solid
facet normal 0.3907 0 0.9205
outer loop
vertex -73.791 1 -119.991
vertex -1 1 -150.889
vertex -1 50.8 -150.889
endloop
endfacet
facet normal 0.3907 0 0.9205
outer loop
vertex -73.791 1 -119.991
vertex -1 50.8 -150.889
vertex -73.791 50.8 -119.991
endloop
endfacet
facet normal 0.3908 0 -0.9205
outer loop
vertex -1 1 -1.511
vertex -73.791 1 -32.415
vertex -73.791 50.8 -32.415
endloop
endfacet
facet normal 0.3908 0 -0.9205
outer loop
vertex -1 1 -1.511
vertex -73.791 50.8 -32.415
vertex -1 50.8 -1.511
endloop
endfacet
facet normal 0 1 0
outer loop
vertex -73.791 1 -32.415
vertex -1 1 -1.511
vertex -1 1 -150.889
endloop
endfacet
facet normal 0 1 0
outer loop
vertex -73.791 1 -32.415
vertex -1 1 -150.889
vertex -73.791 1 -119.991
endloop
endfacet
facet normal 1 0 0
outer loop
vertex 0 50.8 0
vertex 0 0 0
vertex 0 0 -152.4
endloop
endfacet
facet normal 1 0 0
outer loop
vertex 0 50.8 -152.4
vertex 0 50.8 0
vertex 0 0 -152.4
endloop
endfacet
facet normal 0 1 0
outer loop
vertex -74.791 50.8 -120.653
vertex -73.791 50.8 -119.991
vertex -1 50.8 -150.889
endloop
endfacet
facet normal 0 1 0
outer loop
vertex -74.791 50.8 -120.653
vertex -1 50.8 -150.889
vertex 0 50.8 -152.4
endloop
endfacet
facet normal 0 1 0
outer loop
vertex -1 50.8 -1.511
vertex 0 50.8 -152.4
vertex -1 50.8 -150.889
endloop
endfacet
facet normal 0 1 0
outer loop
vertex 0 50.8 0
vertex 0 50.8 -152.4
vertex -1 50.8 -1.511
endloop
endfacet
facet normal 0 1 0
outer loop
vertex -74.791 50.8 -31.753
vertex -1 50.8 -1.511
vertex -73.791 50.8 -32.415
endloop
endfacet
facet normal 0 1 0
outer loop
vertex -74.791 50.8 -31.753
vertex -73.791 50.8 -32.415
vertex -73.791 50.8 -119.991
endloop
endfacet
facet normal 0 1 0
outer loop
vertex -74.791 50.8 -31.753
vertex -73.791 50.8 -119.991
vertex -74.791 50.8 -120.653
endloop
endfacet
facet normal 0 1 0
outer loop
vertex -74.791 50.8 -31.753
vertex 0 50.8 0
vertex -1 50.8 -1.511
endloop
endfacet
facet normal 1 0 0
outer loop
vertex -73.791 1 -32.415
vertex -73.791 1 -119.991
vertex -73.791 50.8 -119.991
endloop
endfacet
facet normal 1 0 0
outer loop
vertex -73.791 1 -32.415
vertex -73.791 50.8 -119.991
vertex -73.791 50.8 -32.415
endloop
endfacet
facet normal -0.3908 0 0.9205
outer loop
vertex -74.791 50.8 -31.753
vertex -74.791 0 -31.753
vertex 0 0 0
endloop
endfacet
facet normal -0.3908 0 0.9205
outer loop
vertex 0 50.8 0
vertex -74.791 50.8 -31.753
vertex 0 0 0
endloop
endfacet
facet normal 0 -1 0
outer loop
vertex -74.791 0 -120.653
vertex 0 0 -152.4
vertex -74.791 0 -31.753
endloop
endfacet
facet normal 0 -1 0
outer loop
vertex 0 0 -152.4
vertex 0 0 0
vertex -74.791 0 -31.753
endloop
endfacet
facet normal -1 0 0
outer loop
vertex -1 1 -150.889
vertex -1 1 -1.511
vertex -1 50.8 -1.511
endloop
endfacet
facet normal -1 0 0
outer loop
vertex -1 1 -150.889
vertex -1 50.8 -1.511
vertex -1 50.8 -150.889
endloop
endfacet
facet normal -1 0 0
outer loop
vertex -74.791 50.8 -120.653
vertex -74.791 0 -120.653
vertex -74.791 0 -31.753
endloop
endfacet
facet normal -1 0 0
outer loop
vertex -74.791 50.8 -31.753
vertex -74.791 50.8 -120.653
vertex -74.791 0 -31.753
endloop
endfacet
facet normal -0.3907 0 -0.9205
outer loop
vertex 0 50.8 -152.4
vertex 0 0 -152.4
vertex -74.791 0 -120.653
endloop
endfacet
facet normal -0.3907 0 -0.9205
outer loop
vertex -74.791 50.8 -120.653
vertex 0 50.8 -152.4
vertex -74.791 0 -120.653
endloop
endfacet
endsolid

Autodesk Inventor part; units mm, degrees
ref_plane "YZ Plane" through (0, 0, 0) normal (1, 0, 0) x (0, 1, 0)
ref_plane "XZ Plane" through (0, 0, 0) normal (0, 1, 0) x (-1, 0, 0)
ref_plane "XY Plane" through (0, 0, 0) normal (0, 0, 1) x (1, 0, 0)
sketch "Sketch1" plane through (0, 0, 0) normal (0, 1, 0) x (-1, 0, 0)
  line L0 (0, 0) -> (0, -152.4)
  line L1 (0, -152.4) -> (74.791, -120.6531)
  line L2 (74.791, -120.6531) -> (74.791, -31.7531)
  line L3 (74.791, -31.7531) -> (0, 0)
  dimension "d5" = 152.4
  dimension "d6" = 81.25
  dimension "d7" = 67
  dimension "d8" = 88.9
extrude "Extrusion1" add sketch "Sketch1" along normal blind 50.8
shell "Shell1" thickness 1 removed faces 1 at (-24.9303, 50.8, -61.3844)
properties part number "footprint"
